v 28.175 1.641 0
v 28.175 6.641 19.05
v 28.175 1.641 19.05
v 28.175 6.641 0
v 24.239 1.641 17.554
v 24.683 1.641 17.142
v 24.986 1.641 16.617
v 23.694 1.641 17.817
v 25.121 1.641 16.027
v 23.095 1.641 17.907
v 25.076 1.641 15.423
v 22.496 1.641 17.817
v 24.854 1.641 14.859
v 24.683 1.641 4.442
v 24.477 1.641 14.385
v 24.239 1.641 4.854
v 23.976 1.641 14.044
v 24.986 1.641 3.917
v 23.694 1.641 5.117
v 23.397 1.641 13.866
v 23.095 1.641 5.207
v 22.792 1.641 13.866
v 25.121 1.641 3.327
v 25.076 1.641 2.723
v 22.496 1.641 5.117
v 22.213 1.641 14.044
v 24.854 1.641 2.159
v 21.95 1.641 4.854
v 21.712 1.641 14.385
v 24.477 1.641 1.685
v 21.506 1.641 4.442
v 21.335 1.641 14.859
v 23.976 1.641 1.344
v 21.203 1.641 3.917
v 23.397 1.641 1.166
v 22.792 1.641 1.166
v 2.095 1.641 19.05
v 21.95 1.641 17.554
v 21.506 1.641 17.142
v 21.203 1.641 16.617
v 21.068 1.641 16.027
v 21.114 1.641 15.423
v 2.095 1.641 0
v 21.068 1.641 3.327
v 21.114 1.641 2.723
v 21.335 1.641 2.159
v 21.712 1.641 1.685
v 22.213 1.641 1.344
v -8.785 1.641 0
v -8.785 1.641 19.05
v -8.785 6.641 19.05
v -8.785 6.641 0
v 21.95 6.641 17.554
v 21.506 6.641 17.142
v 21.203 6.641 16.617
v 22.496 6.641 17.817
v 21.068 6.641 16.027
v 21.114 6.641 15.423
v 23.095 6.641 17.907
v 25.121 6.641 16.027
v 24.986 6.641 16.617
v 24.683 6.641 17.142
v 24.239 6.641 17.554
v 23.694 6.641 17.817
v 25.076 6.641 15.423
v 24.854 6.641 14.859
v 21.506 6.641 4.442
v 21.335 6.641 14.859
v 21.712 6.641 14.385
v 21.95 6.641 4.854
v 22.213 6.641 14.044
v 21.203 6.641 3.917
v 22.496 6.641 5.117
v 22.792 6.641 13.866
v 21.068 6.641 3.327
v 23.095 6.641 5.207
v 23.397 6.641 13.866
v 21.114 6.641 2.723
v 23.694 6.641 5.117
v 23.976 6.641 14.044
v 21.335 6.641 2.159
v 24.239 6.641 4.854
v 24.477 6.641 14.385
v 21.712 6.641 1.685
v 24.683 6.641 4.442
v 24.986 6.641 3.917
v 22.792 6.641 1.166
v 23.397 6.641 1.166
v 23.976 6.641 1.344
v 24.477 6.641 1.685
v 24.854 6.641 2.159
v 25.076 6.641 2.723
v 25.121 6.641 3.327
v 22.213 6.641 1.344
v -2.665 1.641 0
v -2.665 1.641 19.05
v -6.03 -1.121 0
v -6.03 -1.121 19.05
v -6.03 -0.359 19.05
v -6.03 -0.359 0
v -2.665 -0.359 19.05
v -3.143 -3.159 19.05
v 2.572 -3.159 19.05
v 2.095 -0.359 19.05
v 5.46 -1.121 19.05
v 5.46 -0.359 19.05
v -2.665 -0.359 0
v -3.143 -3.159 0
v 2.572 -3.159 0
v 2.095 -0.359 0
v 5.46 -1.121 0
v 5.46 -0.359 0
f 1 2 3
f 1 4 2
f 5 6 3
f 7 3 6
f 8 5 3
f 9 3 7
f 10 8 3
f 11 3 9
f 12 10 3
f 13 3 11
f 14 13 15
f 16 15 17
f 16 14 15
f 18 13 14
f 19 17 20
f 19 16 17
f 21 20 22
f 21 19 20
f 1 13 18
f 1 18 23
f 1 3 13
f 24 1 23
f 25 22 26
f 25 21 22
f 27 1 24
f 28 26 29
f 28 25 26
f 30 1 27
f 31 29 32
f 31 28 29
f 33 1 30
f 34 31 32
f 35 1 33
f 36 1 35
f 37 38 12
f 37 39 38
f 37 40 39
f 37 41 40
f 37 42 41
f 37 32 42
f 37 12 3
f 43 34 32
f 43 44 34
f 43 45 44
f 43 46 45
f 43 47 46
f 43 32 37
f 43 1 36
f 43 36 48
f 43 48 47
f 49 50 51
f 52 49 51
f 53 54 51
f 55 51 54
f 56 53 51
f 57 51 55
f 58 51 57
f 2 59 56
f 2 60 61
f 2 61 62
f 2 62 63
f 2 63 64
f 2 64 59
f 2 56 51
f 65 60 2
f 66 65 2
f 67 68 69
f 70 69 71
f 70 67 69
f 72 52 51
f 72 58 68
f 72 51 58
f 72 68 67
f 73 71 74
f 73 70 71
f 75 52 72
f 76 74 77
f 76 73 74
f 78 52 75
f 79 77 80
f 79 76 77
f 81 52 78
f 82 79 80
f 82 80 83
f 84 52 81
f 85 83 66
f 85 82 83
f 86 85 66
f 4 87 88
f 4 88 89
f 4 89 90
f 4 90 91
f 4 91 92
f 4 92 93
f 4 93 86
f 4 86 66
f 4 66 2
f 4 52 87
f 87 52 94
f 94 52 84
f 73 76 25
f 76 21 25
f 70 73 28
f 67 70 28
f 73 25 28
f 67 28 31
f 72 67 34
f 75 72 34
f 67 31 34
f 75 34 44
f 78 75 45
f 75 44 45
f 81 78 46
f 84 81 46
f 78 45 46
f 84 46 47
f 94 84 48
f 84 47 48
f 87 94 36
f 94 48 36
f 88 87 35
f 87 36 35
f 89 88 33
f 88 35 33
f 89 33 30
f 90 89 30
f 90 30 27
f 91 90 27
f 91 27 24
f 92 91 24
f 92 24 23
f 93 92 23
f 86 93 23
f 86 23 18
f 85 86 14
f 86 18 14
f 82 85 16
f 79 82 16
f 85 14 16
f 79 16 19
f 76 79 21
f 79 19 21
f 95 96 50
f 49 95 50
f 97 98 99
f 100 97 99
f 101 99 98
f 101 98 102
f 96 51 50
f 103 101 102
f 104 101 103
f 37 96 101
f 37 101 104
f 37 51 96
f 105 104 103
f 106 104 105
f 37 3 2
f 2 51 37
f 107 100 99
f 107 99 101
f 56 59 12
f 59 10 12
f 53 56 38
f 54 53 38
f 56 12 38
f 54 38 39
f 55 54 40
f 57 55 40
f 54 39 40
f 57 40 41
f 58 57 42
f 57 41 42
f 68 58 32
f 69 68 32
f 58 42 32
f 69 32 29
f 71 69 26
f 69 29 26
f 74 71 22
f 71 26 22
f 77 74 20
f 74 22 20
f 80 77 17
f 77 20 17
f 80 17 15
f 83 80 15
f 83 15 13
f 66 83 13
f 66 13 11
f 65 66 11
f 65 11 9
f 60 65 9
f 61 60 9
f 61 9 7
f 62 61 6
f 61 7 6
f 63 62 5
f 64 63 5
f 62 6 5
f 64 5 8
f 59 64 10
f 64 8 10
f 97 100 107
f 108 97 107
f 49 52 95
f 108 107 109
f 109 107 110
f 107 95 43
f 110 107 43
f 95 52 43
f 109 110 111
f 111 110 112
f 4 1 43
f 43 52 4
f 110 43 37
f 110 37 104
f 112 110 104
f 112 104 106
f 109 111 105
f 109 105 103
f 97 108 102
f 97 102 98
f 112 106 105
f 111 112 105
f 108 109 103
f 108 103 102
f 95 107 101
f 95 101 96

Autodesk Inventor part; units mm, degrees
ref_plane "YZ Plane" through (0, 0, 0) normal (1, 0, 0) x (0, 1, 0)
ref_plane "XZ Plane" through (0, 0, 0) normal (0, 1, 0) x (-1, 0, 0)
ref_plane "XY Plane" through (0, 0, 0) normal (0, 0, 1) x (1, 0, 0)
sketch "Sketch1" plane through (0, 0, 0) normal (0, 0, 1) x (1, 0, 0)
  line L0 (0, 0) -> (14.5304, 0)
  line L1 (-8.7854, 6.6412) -> (8.2146, 6.6412)
  line L2 (8.2146, 1.6412) -> (2.0946, 1.6412)
  line L3 (2.0946, 1.6412) -> (2.0946, -0.3588)
  line L4 (2.0946, -0.3588) -> (5.4596, -0.3588)
  line L5 (2.5721, -3.1588) -> (-3.1429, -3.1588)
  line L6 (-3.1429, -3.1588) -> (-6.0304, -1.1208)
  line L7 (-6.0304, -1.1208) -> (-6.0304, -0.3588)
  line L8 (-6.0304, -0.3588) -> (-2.6654, -0.3588)
  line L9 (-2.6654, -0.3588) -> (-2.6654, 1.6412)
  line L10 (-2.6654, 1.6412) -> (-8.7854, 1.6412)
  line L11 (-8.7854, 1.6412) -> (-8.7854, 6.6412)
  line L12 (5.4596, -0.3588) -> (5.4596, -1.1208)
  line L13 (5.4596, -1.1208) -> (2.5721, -3.1588)
  line L14 (8.2146, 6.6412) -> (28.1746, 6.6412)
  line L15 (28.1746, 6.6412) -> (28.1746, 1.6412)
  line L16 (28.1746, 1.6412) -> (8.2146, 1.6412)
  dimension "d2" = 5
  dimension "d3" = 2
  dimension "d4" = 4.76
  dimension "d6" = 11.49
  dimension "d7" = 2.755
  dimension "d8" = 5.715
  dimension "d9" = 5.6425
  dimension "d10" = 6.12
  dimension "d11" = 0.762
  dimension "d12" = 0.762
  dimension "d16" = 26.08
  dimension "d50" = 144.786
  dimension "d51" = 2.8875
extrude "Extrusion1" add sketch "Sketch1" along normal blind 19.05
sketch "Sketch3" plane through (-8.7854, 6.6412, 0) normal (0, 1, 0) x (1, 0, 0)
  line L0 (36.96, 0) -> (36.96, -19.05) projected
  line L1 (0, 0) -> (36.96, 0) projected
  line L2 (36.96, -19.05) -> (0, -19.05) projected
  point P0 (8.7854, 0)
  point P1 (31.88, -15.875)
  point P2 (31.88, -3.175)
  dimension "d27" = 5.08
  dimension "d28" = 5.08
  dimension "d36" = 3.175
  dimension "d37" = 3.175
hole "Hole1" at (23.0946, 6.6412, 15.875) at (23.0946, 6.6412, 3.175) direction (0, -1, 0) diameter 4.064 depth 25.4 tip angle 118
equation "\"d7\" = -0.5 * d6 + 0.5 * d0"
equation "\"d9\" = -0.5 * d8 + 0.5 * d0"
equation "\"d10\" = -0.5 * d4 + 0.5 * d0"
equation "\"d12\" = d11"
equation "\"d37\" = d36"
equation "\"d0\" = 17"
properties part number "Sliderfor2020"
